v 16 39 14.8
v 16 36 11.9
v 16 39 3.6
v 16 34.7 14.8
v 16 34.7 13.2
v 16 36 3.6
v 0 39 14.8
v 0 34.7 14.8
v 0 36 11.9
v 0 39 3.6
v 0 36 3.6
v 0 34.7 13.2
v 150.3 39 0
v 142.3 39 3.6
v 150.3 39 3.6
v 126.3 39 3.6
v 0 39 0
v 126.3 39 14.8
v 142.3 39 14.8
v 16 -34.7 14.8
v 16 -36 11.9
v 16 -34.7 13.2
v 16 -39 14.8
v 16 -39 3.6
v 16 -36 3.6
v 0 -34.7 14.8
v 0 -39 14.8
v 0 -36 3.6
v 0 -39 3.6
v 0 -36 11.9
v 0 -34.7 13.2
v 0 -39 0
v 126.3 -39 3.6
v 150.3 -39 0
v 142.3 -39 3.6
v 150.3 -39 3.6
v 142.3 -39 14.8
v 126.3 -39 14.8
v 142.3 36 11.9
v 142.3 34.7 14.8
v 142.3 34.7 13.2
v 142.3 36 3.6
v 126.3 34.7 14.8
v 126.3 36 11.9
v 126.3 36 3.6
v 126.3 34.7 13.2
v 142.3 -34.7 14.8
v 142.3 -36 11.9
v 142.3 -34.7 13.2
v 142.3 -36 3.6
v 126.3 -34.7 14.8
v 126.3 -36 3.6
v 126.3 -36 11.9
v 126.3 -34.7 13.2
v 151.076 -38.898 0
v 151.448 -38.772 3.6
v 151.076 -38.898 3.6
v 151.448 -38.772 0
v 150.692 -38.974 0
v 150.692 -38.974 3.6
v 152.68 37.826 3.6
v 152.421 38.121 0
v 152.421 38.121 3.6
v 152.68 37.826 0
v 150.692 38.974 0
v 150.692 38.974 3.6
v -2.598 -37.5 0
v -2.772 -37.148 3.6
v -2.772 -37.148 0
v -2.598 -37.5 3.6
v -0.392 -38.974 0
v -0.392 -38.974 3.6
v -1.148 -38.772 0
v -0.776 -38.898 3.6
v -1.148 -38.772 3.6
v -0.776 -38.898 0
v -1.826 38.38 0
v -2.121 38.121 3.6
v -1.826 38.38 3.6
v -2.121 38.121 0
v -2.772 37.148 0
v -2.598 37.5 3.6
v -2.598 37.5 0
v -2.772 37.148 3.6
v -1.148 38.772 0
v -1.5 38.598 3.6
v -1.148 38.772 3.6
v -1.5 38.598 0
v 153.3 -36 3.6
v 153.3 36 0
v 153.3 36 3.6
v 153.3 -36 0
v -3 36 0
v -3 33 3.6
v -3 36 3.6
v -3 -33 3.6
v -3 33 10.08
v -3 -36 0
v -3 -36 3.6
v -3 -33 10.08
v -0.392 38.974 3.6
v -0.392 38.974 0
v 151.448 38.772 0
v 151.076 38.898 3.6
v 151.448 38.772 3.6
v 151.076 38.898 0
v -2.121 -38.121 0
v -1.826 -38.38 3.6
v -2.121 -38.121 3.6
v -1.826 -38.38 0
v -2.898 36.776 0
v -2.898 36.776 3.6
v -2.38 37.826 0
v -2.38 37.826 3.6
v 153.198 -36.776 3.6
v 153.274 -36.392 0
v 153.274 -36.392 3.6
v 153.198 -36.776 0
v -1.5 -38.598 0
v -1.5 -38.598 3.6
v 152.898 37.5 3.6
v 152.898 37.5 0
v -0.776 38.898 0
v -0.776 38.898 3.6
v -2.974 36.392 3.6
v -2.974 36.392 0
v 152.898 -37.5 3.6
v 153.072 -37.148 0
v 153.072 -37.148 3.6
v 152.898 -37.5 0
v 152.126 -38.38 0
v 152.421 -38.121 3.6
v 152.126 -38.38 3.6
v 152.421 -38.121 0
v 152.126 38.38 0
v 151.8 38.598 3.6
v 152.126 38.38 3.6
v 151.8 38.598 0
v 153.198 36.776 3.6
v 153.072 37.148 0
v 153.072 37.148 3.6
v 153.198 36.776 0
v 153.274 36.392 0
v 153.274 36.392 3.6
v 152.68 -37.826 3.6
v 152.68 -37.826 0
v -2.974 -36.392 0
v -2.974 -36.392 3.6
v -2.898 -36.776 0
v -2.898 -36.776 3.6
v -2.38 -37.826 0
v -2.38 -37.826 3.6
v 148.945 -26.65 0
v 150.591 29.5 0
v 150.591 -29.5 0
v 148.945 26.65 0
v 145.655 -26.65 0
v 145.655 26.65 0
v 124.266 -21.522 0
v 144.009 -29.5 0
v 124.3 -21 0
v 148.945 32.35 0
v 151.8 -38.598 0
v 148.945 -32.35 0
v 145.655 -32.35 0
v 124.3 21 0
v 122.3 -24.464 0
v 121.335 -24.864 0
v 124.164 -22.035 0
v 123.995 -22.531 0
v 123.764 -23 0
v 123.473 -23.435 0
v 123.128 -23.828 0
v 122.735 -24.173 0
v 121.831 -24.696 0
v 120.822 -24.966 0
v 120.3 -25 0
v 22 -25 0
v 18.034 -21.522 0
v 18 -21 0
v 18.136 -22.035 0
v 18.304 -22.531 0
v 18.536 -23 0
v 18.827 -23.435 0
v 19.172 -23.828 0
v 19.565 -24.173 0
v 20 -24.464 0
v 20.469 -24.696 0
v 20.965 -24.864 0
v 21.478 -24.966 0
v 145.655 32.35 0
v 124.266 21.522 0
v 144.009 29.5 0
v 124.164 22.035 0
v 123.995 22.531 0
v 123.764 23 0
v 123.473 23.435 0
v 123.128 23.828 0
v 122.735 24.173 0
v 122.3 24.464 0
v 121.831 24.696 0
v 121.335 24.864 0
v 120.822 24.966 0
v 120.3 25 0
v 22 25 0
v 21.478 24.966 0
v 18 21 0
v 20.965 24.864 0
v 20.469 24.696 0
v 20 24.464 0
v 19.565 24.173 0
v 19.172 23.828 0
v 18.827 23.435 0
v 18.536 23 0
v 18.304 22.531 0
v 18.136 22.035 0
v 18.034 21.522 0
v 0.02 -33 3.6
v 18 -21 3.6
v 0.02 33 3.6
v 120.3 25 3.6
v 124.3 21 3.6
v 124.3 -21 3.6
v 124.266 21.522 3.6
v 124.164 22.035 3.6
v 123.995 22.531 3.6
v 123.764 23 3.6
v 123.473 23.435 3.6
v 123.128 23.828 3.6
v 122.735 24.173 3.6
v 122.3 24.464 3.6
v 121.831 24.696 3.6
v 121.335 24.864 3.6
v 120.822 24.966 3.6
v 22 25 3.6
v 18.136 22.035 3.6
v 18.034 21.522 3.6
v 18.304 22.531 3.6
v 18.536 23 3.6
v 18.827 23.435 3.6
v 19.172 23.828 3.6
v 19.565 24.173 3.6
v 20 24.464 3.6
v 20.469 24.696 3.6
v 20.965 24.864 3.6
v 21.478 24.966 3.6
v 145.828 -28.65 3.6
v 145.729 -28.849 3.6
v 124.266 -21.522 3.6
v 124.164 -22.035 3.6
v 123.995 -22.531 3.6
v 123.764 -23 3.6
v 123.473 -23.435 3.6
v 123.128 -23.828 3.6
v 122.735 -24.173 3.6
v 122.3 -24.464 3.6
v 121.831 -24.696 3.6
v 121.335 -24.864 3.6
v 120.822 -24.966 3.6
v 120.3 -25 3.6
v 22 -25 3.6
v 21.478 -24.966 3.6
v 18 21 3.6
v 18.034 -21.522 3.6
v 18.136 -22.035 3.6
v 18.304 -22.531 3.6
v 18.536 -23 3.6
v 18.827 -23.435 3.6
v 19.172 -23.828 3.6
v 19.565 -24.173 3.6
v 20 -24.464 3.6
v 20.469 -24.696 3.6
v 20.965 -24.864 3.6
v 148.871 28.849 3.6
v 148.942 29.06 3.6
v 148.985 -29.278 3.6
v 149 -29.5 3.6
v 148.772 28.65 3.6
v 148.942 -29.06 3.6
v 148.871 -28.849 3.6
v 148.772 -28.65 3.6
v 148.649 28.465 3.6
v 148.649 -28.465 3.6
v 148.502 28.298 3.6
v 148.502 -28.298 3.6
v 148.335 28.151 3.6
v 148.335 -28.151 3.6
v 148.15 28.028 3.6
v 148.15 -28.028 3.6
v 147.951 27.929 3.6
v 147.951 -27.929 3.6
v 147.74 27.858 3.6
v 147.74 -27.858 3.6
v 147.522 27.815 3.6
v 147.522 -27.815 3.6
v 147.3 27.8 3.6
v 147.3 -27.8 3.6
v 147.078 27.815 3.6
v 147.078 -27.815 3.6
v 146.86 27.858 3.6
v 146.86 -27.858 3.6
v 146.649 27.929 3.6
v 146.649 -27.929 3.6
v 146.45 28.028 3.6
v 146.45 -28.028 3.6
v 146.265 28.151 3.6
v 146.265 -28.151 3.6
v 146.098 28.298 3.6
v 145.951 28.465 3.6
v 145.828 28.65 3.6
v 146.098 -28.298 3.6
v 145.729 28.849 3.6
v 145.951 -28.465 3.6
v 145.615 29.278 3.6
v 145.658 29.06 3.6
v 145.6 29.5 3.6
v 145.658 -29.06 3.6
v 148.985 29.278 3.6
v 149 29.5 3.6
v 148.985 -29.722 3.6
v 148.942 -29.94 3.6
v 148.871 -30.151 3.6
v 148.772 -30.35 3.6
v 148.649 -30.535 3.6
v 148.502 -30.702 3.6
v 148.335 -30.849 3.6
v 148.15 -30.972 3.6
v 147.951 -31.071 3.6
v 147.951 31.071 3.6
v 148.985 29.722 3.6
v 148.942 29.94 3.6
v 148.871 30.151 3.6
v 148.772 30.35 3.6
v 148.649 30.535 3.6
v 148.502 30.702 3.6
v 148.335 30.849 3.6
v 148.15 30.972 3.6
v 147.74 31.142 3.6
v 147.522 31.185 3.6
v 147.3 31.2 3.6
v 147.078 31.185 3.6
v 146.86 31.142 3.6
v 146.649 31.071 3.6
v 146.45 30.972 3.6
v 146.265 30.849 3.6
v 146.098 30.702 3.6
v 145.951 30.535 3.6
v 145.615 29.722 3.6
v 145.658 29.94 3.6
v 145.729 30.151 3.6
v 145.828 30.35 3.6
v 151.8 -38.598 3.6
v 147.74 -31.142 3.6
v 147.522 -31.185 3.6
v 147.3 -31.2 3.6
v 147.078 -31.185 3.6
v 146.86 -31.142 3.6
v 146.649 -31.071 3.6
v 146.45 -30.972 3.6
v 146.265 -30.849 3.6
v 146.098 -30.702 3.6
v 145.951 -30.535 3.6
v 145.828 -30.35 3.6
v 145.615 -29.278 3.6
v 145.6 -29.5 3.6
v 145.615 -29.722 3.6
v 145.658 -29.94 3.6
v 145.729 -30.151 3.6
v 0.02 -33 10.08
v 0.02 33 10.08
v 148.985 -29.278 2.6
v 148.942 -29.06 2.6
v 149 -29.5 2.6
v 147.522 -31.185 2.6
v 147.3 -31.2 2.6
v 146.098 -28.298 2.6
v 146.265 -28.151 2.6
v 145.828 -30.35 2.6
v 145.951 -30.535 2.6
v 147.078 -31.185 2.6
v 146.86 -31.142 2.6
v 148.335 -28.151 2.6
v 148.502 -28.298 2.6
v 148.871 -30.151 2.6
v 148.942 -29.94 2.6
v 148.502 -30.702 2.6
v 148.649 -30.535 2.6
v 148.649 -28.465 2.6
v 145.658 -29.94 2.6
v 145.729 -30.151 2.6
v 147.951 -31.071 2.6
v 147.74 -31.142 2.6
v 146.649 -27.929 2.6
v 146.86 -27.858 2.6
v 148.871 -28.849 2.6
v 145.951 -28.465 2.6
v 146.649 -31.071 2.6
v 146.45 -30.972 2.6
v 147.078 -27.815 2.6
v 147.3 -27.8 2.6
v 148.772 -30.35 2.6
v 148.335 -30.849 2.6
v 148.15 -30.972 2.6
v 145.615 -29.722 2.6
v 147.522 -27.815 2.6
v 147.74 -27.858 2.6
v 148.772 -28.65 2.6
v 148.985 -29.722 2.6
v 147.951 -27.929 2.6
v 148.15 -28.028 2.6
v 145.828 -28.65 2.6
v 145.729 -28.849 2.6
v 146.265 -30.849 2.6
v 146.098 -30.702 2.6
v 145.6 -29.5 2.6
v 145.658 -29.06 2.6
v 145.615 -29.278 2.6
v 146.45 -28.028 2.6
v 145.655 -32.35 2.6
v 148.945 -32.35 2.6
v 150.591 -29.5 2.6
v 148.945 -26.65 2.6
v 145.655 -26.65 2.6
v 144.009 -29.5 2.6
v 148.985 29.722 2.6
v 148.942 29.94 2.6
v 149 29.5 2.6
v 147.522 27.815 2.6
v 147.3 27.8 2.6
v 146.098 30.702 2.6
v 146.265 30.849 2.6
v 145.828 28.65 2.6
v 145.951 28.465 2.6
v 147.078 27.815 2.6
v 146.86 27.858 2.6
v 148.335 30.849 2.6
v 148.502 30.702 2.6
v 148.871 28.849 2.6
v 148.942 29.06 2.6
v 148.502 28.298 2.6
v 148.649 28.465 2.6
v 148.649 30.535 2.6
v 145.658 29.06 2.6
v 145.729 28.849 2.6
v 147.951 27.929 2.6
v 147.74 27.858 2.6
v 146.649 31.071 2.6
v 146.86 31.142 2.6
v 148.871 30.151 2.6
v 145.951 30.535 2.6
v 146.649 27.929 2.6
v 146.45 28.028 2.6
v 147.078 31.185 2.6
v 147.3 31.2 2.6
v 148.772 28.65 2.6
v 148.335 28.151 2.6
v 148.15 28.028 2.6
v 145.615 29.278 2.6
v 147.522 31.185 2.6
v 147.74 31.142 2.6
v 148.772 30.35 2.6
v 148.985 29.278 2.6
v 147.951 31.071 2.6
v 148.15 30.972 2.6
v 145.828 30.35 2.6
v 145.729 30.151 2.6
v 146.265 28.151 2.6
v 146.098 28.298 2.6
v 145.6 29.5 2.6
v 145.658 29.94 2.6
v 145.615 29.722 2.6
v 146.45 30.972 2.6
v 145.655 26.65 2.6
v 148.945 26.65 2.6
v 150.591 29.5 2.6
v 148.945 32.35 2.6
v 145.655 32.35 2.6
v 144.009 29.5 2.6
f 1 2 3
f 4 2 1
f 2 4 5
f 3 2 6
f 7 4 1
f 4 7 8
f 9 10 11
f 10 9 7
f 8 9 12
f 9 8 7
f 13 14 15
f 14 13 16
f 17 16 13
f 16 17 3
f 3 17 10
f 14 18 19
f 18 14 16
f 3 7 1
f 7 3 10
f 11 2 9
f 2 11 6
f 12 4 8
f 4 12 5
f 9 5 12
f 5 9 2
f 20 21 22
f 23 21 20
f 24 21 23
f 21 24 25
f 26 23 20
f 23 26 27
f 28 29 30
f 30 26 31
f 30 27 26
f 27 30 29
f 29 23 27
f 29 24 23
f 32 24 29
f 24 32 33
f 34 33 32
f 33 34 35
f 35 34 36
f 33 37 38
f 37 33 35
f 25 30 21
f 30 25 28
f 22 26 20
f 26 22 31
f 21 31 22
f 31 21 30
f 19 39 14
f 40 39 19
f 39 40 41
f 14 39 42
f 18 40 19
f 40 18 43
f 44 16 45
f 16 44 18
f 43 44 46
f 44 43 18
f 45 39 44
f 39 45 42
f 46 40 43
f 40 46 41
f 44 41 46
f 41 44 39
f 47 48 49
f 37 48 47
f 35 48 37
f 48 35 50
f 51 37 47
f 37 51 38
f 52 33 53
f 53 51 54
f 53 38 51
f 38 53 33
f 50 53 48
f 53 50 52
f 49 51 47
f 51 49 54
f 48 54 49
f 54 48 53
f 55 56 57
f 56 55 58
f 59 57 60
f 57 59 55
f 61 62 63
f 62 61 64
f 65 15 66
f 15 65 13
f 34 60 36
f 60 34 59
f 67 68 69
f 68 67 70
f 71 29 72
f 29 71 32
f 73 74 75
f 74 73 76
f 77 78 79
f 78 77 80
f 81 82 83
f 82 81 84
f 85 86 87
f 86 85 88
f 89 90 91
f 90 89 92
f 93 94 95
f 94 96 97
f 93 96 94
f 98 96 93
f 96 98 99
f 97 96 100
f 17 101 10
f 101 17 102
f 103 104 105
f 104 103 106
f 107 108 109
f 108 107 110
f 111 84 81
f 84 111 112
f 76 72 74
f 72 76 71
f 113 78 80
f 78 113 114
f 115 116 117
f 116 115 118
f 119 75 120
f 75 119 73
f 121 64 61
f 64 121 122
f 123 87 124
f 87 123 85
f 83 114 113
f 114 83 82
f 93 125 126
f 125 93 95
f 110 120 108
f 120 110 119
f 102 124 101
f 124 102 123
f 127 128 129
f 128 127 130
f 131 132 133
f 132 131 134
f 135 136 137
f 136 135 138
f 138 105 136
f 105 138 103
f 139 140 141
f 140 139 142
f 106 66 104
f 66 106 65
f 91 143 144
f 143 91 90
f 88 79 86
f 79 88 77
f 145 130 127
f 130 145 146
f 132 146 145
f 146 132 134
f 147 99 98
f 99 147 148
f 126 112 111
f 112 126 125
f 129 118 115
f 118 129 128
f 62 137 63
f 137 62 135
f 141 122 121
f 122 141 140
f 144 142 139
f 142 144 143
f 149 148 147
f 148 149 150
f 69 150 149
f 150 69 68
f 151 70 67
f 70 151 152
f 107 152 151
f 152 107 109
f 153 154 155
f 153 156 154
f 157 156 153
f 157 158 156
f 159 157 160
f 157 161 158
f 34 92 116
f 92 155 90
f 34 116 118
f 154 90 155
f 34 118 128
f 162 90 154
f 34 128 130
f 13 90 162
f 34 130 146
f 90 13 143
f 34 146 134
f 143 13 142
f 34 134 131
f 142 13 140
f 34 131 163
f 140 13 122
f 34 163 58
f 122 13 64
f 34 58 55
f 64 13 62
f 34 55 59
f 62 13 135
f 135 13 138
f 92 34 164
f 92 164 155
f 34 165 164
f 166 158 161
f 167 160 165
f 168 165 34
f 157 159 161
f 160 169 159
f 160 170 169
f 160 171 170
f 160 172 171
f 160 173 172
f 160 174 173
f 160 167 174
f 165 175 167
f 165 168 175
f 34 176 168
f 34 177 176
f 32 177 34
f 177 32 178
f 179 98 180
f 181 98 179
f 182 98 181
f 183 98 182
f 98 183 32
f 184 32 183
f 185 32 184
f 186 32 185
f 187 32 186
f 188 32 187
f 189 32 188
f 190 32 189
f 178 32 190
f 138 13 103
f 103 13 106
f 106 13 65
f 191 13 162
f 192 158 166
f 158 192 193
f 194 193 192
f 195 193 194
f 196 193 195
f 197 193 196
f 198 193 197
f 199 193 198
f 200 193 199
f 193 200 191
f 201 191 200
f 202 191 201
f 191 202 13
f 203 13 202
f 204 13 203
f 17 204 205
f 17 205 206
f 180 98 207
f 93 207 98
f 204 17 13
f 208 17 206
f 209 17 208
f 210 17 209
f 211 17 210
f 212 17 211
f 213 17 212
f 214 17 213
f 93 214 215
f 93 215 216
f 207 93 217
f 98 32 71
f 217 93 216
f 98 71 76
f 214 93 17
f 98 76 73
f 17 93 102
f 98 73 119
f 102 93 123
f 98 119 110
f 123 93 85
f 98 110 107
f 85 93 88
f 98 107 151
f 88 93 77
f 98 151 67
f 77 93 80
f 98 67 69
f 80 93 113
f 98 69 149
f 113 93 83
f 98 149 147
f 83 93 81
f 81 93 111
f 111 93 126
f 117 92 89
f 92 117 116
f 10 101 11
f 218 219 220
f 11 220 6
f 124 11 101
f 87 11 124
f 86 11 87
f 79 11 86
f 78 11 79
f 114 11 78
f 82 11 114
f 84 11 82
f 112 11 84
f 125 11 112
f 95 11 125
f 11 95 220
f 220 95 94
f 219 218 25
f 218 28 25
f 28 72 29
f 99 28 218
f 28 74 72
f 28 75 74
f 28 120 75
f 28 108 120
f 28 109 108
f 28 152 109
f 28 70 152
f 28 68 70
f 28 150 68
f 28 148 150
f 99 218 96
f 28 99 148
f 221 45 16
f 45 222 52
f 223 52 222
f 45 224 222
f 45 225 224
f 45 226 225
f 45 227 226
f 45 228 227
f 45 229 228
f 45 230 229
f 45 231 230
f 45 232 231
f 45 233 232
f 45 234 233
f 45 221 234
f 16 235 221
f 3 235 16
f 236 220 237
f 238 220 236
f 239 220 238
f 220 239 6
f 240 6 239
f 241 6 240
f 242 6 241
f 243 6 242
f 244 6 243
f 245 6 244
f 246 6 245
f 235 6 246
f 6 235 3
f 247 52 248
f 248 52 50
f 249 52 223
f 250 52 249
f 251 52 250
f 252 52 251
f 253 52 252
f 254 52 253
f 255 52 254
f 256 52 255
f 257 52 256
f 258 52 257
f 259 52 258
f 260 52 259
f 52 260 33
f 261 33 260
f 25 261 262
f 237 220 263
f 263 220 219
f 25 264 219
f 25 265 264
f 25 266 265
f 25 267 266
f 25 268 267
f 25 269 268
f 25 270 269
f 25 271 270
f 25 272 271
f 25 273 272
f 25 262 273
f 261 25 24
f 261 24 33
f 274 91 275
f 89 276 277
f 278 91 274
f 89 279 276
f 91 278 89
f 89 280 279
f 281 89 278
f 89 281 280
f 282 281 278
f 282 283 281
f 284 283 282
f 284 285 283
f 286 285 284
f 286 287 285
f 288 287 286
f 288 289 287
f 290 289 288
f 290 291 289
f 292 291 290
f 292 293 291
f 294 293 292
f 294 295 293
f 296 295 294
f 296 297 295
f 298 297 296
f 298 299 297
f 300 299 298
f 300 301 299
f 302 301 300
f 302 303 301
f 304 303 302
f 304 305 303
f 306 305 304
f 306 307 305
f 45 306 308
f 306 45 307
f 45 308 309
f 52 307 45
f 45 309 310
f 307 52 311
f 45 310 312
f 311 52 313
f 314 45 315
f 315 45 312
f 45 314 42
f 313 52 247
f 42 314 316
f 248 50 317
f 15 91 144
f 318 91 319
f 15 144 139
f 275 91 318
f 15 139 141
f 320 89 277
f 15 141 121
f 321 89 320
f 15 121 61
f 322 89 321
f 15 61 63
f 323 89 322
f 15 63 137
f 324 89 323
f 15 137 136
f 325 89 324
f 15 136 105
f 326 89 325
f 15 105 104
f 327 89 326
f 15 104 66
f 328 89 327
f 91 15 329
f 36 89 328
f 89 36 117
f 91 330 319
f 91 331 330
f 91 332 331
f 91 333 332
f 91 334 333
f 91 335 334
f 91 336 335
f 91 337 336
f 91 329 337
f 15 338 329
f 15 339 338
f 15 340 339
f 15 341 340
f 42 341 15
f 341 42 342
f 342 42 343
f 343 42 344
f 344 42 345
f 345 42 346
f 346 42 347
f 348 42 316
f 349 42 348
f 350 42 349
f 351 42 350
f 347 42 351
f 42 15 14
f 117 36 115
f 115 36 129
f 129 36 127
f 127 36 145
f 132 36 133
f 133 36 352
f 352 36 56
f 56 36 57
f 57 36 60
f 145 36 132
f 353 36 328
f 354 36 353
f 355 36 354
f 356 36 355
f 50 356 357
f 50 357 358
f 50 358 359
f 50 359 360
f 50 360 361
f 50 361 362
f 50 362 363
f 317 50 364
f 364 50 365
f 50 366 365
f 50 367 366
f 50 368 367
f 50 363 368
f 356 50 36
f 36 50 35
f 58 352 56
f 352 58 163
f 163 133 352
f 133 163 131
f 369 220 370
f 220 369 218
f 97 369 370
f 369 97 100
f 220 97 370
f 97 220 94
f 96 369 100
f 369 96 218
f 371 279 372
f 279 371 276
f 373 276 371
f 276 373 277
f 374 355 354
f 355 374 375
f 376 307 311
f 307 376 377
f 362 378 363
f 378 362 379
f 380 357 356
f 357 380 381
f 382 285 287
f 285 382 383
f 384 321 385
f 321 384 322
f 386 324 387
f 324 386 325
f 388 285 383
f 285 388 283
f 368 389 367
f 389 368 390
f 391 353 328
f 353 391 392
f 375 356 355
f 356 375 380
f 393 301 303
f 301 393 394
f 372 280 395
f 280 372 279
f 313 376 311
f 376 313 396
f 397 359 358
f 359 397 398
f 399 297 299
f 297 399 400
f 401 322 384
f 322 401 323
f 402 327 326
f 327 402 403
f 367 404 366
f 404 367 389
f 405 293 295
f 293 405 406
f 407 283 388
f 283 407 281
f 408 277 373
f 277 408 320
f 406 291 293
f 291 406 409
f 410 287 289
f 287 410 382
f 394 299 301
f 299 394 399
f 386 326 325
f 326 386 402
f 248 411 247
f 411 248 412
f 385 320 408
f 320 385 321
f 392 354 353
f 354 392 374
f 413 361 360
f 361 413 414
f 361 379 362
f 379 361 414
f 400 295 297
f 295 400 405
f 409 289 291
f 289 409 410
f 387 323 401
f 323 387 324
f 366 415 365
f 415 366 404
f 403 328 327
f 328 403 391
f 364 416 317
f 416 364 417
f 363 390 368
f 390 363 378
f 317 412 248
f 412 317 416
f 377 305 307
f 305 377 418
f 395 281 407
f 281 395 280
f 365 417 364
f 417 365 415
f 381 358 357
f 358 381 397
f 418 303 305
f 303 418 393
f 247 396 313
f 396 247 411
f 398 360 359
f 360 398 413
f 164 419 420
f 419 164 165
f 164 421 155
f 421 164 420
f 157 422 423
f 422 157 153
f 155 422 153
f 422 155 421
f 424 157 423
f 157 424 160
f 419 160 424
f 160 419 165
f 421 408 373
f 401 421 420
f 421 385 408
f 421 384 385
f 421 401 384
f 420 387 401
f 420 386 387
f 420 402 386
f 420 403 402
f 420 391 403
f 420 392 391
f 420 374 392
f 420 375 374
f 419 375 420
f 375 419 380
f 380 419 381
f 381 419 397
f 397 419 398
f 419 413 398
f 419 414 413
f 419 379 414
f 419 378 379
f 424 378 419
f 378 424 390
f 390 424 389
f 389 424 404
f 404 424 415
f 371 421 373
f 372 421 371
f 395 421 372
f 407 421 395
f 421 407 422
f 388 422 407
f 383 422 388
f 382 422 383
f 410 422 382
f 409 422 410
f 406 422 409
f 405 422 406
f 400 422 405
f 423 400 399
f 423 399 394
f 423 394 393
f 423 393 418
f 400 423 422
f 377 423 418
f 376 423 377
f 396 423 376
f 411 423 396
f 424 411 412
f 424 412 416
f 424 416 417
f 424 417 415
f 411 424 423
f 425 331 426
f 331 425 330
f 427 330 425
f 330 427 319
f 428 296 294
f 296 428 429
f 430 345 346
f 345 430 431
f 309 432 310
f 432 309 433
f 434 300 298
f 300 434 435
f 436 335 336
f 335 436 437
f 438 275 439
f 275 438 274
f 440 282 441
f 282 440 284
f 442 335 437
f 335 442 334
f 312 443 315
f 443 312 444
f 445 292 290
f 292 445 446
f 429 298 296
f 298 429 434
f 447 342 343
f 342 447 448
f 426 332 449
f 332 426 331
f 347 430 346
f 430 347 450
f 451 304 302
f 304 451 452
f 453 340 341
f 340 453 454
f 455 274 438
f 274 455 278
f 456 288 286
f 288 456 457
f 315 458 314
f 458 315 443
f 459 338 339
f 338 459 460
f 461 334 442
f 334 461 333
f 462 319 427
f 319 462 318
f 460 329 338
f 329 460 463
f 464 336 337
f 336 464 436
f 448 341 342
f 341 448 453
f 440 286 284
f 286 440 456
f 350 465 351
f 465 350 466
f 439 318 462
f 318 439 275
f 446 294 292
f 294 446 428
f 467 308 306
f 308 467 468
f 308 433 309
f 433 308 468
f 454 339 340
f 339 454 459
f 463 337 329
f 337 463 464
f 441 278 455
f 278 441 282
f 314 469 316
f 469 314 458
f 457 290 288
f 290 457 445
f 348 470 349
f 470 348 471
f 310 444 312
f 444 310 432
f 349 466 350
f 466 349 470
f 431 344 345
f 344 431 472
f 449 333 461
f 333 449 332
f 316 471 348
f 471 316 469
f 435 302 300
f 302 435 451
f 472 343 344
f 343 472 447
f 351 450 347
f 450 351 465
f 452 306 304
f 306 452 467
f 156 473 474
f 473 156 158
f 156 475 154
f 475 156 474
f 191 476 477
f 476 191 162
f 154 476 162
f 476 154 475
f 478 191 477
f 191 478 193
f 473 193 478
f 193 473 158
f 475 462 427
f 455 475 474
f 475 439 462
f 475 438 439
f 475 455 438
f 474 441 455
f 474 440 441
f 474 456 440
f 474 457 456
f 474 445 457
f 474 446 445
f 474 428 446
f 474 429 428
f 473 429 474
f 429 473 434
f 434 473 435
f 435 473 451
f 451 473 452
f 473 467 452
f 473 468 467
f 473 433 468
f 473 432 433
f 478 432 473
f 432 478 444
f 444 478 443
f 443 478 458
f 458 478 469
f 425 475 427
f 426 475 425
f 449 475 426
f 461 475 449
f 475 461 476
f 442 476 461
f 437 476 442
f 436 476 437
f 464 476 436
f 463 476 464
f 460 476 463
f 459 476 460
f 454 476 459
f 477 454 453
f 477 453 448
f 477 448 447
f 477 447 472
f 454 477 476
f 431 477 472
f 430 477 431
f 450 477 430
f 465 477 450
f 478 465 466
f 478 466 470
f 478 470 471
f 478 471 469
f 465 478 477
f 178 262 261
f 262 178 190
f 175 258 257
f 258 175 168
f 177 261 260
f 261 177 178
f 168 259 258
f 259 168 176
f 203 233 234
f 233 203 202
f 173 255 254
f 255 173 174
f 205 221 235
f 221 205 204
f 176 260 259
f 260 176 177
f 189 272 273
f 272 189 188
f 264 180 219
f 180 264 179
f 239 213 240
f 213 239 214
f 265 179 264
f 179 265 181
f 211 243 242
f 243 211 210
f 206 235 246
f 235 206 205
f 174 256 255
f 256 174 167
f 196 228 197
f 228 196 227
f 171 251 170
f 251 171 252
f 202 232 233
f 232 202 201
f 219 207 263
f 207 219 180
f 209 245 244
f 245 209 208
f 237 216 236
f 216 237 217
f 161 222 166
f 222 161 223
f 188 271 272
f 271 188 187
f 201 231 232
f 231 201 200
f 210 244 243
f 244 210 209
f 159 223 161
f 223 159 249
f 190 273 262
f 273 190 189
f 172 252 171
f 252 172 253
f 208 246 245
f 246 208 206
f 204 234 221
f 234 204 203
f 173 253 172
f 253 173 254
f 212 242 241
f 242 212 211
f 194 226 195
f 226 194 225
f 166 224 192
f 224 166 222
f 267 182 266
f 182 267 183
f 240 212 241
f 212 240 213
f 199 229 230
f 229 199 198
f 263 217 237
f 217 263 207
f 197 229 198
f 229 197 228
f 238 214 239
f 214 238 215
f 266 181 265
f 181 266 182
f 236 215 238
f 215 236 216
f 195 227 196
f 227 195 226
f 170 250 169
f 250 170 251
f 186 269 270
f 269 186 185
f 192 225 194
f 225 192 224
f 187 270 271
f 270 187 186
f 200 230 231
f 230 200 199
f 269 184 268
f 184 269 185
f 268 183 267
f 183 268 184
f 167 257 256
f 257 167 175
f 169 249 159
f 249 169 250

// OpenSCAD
// PH-1 HUD cradle. Dimensions in millimeters. The USB-C end faces +X.
// Print one cradle and two keepers. Use two M3 x 8 mm screws and M3 hex nuts.
part = "cradle"; // [cradle, keeper, plate, assembly]

phone_length = 141.5;
phone_width = 71.1;
phone_thickness = 7.8;
end_clearance = 0.8;
side_clearance = 0.45; // Per side.
top_clearance = 0.5;

base = 3.6;
wall = 3;
rail_length = 16;
lip = 1.3;
roof = 1.6;
end_land = 11;
keeper_diameter = 10;
keeper_height = 4.6;
bolt_hole = 3.4;
nut_width = 5.7; // Across flats. Includes clearance for a nominal 5.5 mm M3 nut.
nut_depth = 2.6;

bay_length = phone_length + end_clearance;
half_bay = phone_width / 2 + side_clearance;
stop_x = bay_length + keeper_diameter / 2;
stop_y = half_bay - 6.5;
eps = 0.02;
$fn = 48;

module rounded_rectangle(x, y, length, width, radius) {
    translate([x + radius, y + radius])
        offset(r = radius) square([length - 2 * radius, width - 2 * radius]);
}

module rail(x) {
    clearance_z = base + phone_thickness + top_clearance;
    translate([x, half_bay, base - eps])
        cube([rail_length, wall, clearance_z + lip + roof - base + eps]);

    // The underside rises at 45 degrees toward the display edge.
    hull() {
        translate([x, half_bay, clearance_z])
            cube([rail_length, eps, lip + roof]);
        translate([x, half_bay - lip, clearance_z + lip])
            cube([rail_length, eps, roof]);
    }
}

module cradle() {
    difference() {
        union() {
            linear_extrude(base)
                rounded_rectangle(-wall, -half_bay - wall,
                    bay_length + wall + end_land, 2 * (half_bay + wall), 3);

            // Retain the flat top edge opposite the USB-C connector.
            translate([-wall, -half_bay + 3, base - eps])
                cube([wall + eps, 2 * half_bay - 6, 6.5]);

            // Short corner rails leave both long sides open around the buttons.
            for (x = [0, bay_length - rail_length]) {
                rail(x);
                mirror([0, 1, 0]) rail(x);
            }
        }

        translate([0, 0, -eps])
            linear_extrude(base + 2 * eps)
                rounded_rectangle(18, -half_bay + 11,
                    bay_length - 36, 2 * half_bay - 22, 4);

        for (side = [-1, 1]) {
            translate([stop_x, side * stop_y, -eps]) {
                cylinder(h = base + 2 * eps, d = bolt_hole);
                cylinder(h = nut_depth + eps, r = nut_width / sqrt(3), $fn = 6);
            }
        }
    }
}

module keeper() {
    difference() {
        cylinder(h = keeper_height, d = keeper_diameter);
        translate([0, 0, -eps]) cylinder(h = keeper_height + 2 * eps, d = bolt_hole);
    }
}

if (part == "cradle") cradle();
if (part == "keeper") keeper();
if (part == "plate") {
    cradle();
    // Nest both keepers in the opening, flat on the same build plane.
    for (fraction = [0.4, 0.6])
        translate([bay_length * fraction, 0, 0]) keeper();
}
if (part == "assembly") {
    color([0.23, 0.26, 0.28]) cradle();
    for (side = [-1, 1])
        color([0.90, 0.56, 0.16]) translate([stop_x, side * stop_y, base]) keeper();
}
